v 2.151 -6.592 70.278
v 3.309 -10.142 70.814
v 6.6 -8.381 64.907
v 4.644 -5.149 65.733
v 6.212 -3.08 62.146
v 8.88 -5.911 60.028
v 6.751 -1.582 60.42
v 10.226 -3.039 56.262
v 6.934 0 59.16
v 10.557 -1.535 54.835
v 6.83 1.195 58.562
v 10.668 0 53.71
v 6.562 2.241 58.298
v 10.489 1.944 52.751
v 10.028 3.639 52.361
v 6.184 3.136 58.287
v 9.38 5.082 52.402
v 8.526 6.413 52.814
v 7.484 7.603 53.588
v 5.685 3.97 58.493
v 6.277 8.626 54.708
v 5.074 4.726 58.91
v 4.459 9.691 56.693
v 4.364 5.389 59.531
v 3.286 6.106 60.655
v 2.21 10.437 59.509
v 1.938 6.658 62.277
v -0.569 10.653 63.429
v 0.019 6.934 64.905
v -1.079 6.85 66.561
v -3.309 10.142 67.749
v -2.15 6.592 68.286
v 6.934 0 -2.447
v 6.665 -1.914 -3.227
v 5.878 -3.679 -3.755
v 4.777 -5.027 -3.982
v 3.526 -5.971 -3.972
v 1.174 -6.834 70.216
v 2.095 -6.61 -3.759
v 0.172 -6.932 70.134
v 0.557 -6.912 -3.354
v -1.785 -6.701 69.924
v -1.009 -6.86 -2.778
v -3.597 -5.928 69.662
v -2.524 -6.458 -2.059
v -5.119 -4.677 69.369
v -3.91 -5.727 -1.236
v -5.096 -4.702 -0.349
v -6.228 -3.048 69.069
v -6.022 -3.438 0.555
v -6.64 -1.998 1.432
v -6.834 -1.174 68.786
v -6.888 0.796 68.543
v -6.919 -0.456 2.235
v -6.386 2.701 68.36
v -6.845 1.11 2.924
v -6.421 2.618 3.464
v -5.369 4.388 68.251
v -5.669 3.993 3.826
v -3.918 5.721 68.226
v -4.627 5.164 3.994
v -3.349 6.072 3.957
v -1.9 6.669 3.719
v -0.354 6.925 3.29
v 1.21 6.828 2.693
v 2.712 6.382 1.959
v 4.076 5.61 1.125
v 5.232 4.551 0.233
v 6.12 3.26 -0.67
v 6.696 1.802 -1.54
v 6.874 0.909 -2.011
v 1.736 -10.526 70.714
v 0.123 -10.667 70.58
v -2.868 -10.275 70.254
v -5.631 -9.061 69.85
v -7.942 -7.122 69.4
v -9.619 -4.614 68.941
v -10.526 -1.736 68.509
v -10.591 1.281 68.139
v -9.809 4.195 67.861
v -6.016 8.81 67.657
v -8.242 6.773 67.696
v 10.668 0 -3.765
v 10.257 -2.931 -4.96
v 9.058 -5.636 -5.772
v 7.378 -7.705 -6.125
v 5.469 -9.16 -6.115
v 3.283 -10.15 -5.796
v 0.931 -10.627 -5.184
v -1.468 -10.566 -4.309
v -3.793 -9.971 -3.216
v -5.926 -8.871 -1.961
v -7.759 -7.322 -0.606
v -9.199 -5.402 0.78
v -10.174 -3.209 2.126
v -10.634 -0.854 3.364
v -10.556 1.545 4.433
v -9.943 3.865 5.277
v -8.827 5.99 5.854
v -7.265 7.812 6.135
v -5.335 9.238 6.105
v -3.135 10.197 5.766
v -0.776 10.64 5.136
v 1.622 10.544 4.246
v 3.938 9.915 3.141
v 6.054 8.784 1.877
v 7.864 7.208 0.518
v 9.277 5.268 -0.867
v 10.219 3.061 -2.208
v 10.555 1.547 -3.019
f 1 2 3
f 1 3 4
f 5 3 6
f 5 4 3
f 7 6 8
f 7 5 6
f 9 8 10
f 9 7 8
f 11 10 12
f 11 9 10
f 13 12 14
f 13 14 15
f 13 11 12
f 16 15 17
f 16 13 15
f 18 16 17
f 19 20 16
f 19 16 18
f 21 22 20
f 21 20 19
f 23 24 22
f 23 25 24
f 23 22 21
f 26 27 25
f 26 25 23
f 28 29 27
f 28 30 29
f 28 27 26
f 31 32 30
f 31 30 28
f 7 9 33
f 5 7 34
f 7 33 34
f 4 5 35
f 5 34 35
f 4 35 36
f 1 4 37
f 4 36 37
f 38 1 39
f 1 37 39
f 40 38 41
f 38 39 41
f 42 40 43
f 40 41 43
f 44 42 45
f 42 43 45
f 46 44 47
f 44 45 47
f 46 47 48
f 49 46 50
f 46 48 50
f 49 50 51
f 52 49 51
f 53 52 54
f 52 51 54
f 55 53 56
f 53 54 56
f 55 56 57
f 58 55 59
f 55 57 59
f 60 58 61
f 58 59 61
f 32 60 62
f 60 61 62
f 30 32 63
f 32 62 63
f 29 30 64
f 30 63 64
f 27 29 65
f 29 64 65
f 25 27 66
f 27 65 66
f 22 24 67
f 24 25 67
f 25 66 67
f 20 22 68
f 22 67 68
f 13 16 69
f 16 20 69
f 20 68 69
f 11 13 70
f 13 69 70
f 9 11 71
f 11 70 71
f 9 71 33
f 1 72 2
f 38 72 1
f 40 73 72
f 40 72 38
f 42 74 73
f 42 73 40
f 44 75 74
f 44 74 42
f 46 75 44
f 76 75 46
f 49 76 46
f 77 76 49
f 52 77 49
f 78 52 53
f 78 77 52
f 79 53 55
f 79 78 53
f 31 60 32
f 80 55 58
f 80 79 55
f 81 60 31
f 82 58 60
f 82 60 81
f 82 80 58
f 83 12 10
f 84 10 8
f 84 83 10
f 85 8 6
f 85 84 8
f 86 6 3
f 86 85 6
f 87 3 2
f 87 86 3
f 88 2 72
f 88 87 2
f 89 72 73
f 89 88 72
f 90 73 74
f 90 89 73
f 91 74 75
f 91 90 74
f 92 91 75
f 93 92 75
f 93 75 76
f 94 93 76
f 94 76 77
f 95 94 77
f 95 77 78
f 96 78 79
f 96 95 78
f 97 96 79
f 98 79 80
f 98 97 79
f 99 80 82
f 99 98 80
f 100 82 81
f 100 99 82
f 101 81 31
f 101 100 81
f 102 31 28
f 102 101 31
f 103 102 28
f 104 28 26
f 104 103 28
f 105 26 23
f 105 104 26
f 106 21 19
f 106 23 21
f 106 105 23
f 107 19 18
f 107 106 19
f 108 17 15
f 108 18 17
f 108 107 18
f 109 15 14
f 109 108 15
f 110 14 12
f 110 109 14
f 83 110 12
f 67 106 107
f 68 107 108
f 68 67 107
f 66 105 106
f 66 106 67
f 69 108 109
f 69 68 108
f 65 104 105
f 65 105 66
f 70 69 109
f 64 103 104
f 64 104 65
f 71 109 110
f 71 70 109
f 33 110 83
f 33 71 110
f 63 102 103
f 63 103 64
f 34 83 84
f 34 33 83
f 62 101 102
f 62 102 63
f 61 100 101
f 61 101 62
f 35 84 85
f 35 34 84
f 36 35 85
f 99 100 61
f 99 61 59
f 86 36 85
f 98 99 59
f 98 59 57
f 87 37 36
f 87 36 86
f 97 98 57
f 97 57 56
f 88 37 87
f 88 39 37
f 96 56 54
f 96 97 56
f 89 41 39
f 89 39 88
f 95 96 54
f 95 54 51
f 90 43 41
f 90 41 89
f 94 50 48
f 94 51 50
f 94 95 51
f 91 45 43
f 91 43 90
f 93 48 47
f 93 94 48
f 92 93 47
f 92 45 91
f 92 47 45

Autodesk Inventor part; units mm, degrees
ref_plane "Start Plane" through (0, 0, -8.6396) normal (0, 0, 1) x (1, 0, 0)
ref_plane "End Plane" through (0, 0, 70.8143) normal (0, 0, 1) x (1, 0, 0)
sketch "Sketch" plane through (0, 0, 0) normal (0, 0, 1) x (1, 0, 0)
  circle A0 centre (0, 0) radius 6.9342
  circle A1 centre (0, 0) radius 10.668
  dimension "d0" = 21.336
  dimension "d1" = 3.7338
extrude "Body" add sketch "Sketch" along normal up to surface (79.4539 mm away) from surface at -8.6396
sketch "Sketch3" plane through (0, 0, 0) normal (0, 0, 1) x (1, 0, 0)
  line L0 (0, 0) -> (10, 0)
ref_plane "Work Plane3" through (0, 0, 0) normal (0, -1, 0) x (1, 0, 0)
sketch "Sketch4" plane through (0, 0, 0) normal (0, -1, 0) x (1, 0, 0)
  line L0 (-2, -8.6396) -> (12, -8.6396)
  line L1 (-2, 70.8143) -> (12, 70.8143)
  dimension "d7" = 79.4539
ref_plane "Work Plane4" through (6.5224, -8.4419, -6.1592) normal (-0.3057, 0.3957, -0.866) x (0.3025, 0.9028, 0.3057)
split "Split1" plane through (6.5224, -8.4419, -6.1592) removes the side toward (-0.3057, 0.3957, -0.866)
ref_plane "Work Plane5" through (6.5224, -8.4419, 70.9087) normal (-0.0922, 0.1193, 0.9886) x (0.9957, 0.0055, 0.0922)
split "Split2" plane through (6.5224, -8.4419, 70.9087) removes the side toward (-0.0922, 0.1193, 0.9886)
ref_plane "Work Plane6" through (-9.8011, -4.2125, 86.2321) normal (0.7776, 0.3342, 0.5327) x (0.6055, -0.1695, -0.7776)
split "Split3" plane through (-9.8011, -4.2125, 86.2321) removes the side toward (0.7776, 0.3342, 0.5327)
equation "\"d0\" = G_H"
equation "\"d1\" = G_T"
equation "\"d2\" = G_L"
equation "\"G_H\" = 21.336"
equation "\"G_T\" = 3.7338"
equation "\"G_L\" = 76.97342"
equation "\"G_OFFSET_START\" = 8.6396"
equation "\"G_OFFSET_END\" = 1.53222"
equation "\"d4\" = -G_OFFSET_START"
equation "\"d5\" = G_OFFSET_END + B_L"
equation "\"B_L\" = 69.28203"
properties part number "ANSI - 1/2 x 0.147 - 3.03" material "Steel, Mild"
